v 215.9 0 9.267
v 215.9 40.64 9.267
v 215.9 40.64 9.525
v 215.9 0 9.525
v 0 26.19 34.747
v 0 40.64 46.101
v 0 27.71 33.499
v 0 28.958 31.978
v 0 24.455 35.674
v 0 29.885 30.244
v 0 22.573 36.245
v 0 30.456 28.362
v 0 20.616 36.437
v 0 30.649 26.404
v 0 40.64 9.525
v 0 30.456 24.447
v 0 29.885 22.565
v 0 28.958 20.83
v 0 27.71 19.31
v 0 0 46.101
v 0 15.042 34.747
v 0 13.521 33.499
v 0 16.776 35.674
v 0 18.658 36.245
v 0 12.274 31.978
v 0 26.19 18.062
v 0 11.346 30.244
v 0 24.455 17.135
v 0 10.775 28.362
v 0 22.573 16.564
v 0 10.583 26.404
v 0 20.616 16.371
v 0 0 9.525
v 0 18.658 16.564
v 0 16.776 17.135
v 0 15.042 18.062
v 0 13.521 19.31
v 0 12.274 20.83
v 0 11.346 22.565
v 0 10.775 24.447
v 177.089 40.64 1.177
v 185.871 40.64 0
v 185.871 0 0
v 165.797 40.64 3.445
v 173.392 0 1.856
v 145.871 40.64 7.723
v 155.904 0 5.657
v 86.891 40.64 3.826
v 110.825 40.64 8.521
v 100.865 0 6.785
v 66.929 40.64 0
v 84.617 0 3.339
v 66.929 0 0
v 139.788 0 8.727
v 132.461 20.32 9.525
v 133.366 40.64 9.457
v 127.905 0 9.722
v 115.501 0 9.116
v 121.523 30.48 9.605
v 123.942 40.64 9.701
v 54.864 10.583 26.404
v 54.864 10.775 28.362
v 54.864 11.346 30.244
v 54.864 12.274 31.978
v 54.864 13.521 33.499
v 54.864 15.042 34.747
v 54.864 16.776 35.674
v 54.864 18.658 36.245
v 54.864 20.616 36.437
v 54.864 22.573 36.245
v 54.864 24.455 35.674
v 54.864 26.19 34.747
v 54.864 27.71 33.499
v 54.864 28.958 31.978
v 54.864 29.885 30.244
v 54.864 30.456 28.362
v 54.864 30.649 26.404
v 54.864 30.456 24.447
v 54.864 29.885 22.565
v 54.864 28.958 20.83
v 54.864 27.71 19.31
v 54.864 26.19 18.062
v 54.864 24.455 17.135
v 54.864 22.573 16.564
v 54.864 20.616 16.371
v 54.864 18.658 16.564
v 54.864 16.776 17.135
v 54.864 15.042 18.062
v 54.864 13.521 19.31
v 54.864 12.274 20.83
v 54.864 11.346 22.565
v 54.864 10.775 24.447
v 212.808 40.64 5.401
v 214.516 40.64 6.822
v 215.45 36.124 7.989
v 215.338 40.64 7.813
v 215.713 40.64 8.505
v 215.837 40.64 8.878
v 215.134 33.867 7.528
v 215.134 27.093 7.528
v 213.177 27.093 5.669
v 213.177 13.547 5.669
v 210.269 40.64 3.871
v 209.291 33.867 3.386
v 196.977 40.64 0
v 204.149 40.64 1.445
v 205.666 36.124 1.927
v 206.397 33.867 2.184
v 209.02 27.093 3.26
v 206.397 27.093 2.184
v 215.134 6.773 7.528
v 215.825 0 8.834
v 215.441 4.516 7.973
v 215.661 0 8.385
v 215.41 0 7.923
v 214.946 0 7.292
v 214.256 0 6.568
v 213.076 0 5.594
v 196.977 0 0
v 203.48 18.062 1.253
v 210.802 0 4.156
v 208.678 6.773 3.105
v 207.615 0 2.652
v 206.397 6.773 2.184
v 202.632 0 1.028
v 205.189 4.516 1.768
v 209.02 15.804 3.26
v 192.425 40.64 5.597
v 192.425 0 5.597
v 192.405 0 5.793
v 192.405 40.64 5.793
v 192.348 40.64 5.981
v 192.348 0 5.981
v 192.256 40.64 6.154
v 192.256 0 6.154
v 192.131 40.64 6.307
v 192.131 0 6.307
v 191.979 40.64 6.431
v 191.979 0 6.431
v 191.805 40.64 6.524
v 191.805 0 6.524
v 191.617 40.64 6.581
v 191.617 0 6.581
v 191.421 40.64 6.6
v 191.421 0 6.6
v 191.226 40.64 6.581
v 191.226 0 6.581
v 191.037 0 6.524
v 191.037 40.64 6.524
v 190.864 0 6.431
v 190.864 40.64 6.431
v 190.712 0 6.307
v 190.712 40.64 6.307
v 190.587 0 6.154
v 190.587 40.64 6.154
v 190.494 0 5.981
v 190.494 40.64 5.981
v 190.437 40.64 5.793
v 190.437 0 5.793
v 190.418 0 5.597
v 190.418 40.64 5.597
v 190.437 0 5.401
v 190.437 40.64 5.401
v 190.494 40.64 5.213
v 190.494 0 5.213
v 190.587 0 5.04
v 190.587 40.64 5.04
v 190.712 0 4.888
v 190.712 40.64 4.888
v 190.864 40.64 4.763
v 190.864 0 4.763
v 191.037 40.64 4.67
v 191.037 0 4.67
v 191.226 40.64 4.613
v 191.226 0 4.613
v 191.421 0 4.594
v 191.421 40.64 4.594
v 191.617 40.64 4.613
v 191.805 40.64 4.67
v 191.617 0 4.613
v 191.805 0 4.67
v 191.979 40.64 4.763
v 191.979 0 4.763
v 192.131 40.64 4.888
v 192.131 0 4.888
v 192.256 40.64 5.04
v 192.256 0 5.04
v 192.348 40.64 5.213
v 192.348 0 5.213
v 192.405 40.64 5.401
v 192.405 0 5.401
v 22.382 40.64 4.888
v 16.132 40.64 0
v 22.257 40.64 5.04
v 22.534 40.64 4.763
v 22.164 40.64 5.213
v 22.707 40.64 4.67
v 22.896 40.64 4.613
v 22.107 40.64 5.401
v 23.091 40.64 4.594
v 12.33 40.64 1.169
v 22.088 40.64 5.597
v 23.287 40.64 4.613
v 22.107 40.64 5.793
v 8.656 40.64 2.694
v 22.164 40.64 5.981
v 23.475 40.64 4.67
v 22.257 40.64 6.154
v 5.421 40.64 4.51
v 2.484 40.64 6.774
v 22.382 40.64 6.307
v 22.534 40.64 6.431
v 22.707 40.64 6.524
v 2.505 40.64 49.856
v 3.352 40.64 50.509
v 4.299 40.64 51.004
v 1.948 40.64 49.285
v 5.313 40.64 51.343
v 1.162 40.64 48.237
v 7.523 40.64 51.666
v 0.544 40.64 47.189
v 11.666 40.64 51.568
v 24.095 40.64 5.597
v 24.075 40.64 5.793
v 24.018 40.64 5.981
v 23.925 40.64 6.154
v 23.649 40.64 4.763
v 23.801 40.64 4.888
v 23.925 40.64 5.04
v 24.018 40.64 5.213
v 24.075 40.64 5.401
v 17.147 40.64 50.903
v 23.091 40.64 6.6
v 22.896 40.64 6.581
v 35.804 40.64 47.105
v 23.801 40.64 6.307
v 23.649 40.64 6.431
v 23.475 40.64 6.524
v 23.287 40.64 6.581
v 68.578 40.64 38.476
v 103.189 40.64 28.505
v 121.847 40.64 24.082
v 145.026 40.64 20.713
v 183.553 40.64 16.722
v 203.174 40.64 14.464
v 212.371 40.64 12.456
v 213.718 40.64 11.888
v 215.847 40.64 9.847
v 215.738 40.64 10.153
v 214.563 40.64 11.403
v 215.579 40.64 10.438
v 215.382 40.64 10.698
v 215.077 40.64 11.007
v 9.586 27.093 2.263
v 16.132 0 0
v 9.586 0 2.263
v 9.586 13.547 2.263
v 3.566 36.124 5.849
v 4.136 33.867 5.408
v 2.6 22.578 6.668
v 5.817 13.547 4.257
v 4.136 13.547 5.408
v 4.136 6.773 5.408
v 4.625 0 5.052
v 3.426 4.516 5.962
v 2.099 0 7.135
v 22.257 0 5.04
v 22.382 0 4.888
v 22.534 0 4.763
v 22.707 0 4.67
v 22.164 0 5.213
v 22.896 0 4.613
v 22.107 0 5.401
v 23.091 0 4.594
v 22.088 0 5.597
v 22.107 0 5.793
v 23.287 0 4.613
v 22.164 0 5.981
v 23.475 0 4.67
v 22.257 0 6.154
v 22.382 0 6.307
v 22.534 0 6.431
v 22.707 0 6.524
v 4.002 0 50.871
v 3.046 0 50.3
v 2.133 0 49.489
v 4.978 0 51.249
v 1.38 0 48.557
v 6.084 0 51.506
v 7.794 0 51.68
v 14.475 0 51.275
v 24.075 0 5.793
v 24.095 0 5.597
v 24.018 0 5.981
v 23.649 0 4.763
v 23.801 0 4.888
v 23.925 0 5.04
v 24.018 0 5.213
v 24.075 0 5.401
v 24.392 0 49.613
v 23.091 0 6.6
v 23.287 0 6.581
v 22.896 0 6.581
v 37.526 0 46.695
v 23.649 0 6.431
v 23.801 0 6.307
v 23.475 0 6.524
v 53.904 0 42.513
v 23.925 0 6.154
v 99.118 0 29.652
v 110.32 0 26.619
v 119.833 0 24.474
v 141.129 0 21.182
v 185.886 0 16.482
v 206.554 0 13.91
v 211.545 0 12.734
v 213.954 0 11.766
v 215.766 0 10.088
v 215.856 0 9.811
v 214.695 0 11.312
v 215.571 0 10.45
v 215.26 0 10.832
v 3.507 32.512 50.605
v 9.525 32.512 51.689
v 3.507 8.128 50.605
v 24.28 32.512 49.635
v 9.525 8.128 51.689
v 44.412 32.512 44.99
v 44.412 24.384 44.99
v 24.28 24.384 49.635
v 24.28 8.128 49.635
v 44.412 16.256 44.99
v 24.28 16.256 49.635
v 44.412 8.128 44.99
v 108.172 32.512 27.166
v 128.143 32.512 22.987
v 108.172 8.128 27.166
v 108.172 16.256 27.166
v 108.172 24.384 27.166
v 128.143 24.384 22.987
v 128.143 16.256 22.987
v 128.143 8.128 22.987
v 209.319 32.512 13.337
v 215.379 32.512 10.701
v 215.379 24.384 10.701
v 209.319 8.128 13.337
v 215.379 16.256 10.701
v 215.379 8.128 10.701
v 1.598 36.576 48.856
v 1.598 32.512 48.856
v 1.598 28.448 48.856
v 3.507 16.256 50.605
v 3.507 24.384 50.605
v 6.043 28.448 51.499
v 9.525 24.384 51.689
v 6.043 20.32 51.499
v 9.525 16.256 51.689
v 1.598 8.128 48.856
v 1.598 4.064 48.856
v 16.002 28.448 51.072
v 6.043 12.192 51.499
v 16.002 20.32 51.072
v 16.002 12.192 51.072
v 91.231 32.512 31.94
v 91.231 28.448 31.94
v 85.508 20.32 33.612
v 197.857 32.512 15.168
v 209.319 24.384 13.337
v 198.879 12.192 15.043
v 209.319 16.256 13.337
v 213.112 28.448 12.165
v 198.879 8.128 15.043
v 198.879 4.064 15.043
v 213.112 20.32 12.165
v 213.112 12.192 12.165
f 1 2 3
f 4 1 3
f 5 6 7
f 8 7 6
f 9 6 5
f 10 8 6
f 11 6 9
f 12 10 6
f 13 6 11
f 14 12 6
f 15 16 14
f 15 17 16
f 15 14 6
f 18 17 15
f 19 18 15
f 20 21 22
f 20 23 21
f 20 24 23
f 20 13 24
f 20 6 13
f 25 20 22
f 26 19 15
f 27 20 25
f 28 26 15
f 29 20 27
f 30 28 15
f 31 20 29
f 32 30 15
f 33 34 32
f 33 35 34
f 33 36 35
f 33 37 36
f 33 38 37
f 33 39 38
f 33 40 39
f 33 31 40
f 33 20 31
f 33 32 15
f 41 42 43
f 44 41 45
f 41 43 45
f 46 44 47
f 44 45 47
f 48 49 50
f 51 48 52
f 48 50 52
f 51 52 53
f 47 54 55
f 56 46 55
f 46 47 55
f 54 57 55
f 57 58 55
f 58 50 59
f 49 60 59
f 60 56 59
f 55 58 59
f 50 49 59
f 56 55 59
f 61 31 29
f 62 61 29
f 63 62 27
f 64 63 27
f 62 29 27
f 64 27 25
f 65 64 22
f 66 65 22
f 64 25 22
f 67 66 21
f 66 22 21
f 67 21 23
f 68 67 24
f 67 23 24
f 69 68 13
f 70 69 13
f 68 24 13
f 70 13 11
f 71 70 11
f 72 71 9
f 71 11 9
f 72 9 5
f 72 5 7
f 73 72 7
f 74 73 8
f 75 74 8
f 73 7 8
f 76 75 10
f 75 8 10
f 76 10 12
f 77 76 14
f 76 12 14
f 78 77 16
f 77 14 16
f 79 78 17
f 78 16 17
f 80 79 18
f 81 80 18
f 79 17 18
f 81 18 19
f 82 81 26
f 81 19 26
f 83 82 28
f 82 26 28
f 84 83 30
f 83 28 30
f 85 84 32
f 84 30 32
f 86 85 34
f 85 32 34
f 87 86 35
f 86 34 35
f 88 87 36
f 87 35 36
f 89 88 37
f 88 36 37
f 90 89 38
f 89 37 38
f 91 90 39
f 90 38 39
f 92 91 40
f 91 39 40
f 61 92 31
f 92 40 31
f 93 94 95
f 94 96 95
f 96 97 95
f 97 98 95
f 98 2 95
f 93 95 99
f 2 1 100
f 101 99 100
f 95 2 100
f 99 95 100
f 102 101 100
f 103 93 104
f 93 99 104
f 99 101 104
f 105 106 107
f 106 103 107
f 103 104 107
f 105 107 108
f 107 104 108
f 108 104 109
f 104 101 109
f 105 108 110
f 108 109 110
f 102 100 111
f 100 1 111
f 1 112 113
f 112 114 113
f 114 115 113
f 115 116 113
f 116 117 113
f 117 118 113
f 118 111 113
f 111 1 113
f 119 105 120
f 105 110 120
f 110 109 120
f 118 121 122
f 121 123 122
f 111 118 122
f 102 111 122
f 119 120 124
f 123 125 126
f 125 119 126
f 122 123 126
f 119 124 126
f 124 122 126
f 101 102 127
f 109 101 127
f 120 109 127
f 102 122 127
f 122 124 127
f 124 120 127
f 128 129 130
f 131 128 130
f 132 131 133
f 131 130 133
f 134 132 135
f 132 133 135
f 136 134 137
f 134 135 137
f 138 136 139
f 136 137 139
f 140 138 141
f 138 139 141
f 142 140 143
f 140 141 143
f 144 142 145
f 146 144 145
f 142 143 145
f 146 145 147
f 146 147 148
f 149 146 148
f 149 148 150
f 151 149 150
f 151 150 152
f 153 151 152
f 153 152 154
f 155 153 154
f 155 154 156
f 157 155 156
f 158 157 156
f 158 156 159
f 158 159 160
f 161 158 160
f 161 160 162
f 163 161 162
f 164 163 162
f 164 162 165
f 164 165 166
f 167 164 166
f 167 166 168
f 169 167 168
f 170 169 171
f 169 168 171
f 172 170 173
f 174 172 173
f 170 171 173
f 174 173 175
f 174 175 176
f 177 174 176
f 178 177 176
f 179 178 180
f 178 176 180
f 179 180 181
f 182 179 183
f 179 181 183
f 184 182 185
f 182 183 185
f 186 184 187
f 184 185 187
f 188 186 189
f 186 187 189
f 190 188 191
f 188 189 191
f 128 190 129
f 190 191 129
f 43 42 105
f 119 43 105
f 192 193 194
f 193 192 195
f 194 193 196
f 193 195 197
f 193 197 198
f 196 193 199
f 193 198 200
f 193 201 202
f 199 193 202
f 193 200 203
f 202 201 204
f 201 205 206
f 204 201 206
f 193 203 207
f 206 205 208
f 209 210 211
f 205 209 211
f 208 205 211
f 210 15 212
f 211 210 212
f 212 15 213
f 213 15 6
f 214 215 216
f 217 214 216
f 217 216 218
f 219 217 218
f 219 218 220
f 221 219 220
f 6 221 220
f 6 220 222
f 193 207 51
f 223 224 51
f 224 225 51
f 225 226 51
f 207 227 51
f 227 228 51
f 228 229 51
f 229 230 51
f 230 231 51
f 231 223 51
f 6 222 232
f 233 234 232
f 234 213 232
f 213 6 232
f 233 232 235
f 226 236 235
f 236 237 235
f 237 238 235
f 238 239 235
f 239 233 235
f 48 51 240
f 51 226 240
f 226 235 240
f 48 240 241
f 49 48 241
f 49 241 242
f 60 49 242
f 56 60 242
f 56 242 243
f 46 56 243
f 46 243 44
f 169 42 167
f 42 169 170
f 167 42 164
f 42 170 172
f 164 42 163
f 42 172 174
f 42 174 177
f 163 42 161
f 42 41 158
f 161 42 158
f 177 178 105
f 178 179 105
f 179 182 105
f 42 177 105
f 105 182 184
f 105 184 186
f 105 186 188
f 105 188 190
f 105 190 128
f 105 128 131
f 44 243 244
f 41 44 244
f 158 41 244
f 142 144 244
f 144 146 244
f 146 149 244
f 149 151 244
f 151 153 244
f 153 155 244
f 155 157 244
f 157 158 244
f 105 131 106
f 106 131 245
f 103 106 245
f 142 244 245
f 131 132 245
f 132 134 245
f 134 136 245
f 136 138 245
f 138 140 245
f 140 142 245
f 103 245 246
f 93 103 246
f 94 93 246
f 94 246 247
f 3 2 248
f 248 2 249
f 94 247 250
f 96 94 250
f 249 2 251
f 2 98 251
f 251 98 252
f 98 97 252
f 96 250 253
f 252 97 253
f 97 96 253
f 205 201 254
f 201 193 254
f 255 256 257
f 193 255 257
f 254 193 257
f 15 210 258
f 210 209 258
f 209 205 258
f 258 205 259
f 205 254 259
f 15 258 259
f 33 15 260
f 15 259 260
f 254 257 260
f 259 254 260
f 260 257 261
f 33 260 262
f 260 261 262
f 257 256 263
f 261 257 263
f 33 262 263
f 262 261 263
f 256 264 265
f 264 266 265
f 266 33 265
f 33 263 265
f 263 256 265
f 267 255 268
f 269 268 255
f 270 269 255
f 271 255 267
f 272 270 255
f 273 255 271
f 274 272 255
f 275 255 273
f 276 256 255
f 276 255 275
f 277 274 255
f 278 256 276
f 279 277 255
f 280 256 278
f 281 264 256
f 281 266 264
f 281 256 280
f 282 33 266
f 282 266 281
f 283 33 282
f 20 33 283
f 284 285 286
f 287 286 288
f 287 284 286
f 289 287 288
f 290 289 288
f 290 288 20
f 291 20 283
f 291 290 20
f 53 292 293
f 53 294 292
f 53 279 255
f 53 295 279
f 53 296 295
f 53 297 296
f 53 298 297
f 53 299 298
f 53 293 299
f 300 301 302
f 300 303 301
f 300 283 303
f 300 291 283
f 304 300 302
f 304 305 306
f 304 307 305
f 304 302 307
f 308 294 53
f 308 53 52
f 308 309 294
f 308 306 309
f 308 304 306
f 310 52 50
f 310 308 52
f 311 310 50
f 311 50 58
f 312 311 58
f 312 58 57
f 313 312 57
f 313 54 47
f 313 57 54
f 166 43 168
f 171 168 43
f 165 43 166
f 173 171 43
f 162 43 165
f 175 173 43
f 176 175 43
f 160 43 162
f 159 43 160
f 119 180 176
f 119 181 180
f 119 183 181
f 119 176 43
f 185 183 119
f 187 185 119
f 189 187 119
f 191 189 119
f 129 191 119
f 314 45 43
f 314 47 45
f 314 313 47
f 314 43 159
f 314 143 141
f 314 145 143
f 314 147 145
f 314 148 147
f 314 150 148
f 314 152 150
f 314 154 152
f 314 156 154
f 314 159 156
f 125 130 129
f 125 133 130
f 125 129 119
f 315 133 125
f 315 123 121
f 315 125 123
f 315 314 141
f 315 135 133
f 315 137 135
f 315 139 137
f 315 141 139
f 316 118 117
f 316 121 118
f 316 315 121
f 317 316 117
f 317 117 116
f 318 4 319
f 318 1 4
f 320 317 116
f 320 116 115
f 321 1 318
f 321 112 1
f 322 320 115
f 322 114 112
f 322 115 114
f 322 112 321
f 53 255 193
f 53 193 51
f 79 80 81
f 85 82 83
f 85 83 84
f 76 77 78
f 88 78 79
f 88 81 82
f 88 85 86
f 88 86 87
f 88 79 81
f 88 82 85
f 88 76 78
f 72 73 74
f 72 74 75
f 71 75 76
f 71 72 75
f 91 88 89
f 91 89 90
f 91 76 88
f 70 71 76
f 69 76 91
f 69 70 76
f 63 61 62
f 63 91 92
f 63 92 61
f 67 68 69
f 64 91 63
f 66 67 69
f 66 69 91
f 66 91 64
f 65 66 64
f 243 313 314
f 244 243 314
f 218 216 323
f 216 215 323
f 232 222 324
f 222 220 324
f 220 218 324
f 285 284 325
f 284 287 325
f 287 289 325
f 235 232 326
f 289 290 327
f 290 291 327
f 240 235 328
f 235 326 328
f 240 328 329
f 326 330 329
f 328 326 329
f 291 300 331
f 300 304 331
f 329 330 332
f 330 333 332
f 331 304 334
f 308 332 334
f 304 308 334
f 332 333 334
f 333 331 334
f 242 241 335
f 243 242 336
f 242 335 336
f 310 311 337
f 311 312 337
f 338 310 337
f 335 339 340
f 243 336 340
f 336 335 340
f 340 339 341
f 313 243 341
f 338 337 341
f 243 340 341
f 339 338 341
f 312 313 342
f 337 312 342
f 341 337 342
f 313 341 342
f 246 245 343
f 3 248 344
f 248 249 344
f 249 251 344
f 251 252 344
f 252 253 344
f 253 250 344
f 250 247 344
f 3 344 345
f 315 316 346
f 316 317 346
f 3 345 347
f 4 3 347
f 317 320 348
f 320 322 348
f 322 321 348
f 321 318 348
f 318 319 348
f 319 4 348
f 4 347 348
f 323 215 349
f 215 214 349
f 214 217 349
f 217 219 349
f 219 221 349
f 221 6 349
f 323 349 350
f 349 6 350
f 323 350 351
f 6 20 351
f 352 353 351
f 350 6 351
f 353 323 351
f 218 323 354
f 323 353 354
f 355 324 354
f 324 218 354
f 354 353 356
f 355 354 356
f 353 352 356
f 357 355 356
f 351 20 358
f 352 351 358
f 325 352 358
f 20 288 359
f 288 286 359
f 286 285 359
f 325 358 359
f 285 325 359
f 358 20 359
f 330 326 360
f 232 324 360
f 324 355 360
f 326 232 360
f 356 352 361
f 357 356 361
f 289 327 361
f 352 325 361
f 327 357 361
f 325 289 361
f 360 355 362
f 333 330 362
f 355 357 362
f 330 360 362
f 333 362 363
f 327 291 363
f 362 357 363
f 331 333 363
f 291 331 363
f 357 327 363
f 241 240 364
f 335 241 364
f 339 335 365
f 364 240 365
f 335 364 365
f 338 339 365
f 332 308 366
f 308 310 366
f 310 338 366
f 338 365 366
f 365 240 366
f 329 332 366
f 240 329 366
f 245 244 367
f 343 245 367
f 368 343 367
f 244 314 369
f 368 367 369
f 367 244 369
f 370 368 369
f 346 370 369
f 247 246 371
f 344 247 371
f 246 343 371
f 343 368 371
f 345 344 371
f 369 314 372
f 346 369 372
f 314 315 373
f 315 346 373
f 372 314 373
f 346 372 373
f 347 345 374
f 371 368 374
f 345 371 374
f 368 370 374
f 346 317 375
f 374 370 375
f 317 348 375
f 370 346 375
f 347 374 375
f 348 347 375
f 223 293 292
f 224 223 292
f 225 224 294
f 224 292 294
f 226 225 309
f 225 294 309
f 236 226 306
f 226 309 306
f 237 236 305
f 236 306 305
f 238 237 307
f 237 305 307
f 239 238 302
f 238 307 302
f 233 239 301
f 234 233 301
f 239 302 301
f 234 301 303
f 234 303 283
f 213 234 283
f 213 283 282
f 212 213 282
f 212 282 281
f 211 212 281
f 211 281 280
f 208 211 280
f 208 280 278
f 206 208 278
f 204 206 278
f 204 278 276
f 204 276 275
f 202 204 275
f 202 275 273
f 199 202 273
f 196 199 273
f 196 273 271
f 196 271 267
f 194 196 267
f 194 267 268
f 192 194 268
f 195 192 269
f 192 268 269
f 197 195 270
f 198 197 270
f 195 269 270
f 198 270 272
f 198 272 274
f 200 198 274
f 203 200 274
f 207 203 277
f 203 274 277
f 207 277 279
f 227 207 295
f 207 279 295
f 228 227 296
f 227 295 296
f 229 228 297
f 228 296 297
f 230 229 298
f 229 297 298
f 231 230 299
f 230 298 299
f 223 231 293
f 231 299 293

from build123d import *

# Parameters (mm, degrees)
F1_DEPTH = 40.64
F2_R     = 10.033
F3_DEPTH = 54.864
F5_DEPTH = 50.8
F6_R     = 1.0033
F7_DEPTH = 50.8


with BuildPart() as f1:
    # F0 (on Front) → F1 (new body)
    with BuildSketch(Plane.XZ):
        Polygon((0, 63.5), (0, 0), (215.9, 0), (215.9, 19.05), align=None)
    extrude(amount=-F1_DEPTH)

    # F2 (on face) → F3 (cut)
    with BuildSketch(Plane(origin=(0, 0, 0), x_dir=(0, -1, 0), z_dir=(-1, 0, 0))):
        with Locations((-20.6156443834, 26.4044162248)):
            Circle(F2_R)
    extrude(amount=-F3_DEPTH, mode=Mode.SUBTRACT)

    # F4 (on face) → F5 (cut)
    with BuildSketch(Plane.XZ):
        with BuildLine():
            add(Edge.make_bspline(
                [(16.1319528243, 0), (9.1103746855, 1.8526189253), (3.4054441774, 4.8924667394), (0, 9.525)],
                knots=[0.8687756732, 0.8687756732, 0.8687756732, 0.8687756732, 0.9094257938, 0.9094257938, 0.9094257938, 0.9094257938], degree=3))
            Line((0, 9.525), (0, 0))
            Line((0, 0), (16.1319528243, 0))
        make_face()
        with BuildLine():
            Line((0, 63.5), (0, 46.10100016))
            add(Edge.make_bspline(
                [(0, 46.10100016), (2.0657878411, 50.5105752313), (9.5757047951, 55.3901111014), (91.02955709, 32.210039913), (124.9015451965, 21.7663856992), (189.2954565971, 16.6427769383), (215.6624128237, 12.9001936662), (215.9, 9.525)],
                knots=[0, 0, 0, 0, 0.0497683362, 0.1827614083, 0.2811784463, 0.4030285545, 0.4745413014, 0.4745413014, 0.4745413014, 0.4745413014], degree=3))
            Line((215.9, 9.525), (215.9, 19.05))
            Line((215.9, 19.05), (0, 63.5))
        make_face()
        with BuildLine():
            add(Edge.make_bspline(
                [(185.8713920601, 0), (169.3137245185, 1.4601725501), (125.8688018117, 16.8068740981), (91.8671082983, 3.8858105541), (66.9290050864, 0)],
                knots=[0.5664130579, 0.5664130579, 0.5664130579, 0.5664130579, 0.6644164746, 0.7862882052, 0.7862882052, 0.7862882052, 0.7862882052], degree=3))
            Line((66.9290050864, 0), (185.8713920601, 0))
        make_face()
        with BuildLine():
            Line((215.9, 0), (215.9, 9.2667335943))
            add(Edge.make_bspline(
                [(215.9, 9.2667335943), (215.678486687, 6.0080477852), (207.2434450535, 1.1378088917), (196.9770044088, 0)],
                knots=[0.4763393845, 0.4763393845, 0.4763393845, 0.4763393845, 0.543473312, 0.543473312, 0.543473312, 0.543473312], degree=3))
            Line((196.9770044089, 0), (215.9, 0))
        make_face()
    extrude(amount=-F5_DEPTH, mode=Mode.SUBTRACT)

    # F6 (on face) → F7 (cut)
    with BuildSketch(Plane.XZ):
        with Locations((23.0912622064, 5.5970656686)):
            Circle(F6_R)
        with Locations((191.4213299751, 5.5970656686)):
            Circle(F6_R)
    extrude(amount=-F7_DEPTH, mode=Mode.SUBTRACT)


solid = f1.part
